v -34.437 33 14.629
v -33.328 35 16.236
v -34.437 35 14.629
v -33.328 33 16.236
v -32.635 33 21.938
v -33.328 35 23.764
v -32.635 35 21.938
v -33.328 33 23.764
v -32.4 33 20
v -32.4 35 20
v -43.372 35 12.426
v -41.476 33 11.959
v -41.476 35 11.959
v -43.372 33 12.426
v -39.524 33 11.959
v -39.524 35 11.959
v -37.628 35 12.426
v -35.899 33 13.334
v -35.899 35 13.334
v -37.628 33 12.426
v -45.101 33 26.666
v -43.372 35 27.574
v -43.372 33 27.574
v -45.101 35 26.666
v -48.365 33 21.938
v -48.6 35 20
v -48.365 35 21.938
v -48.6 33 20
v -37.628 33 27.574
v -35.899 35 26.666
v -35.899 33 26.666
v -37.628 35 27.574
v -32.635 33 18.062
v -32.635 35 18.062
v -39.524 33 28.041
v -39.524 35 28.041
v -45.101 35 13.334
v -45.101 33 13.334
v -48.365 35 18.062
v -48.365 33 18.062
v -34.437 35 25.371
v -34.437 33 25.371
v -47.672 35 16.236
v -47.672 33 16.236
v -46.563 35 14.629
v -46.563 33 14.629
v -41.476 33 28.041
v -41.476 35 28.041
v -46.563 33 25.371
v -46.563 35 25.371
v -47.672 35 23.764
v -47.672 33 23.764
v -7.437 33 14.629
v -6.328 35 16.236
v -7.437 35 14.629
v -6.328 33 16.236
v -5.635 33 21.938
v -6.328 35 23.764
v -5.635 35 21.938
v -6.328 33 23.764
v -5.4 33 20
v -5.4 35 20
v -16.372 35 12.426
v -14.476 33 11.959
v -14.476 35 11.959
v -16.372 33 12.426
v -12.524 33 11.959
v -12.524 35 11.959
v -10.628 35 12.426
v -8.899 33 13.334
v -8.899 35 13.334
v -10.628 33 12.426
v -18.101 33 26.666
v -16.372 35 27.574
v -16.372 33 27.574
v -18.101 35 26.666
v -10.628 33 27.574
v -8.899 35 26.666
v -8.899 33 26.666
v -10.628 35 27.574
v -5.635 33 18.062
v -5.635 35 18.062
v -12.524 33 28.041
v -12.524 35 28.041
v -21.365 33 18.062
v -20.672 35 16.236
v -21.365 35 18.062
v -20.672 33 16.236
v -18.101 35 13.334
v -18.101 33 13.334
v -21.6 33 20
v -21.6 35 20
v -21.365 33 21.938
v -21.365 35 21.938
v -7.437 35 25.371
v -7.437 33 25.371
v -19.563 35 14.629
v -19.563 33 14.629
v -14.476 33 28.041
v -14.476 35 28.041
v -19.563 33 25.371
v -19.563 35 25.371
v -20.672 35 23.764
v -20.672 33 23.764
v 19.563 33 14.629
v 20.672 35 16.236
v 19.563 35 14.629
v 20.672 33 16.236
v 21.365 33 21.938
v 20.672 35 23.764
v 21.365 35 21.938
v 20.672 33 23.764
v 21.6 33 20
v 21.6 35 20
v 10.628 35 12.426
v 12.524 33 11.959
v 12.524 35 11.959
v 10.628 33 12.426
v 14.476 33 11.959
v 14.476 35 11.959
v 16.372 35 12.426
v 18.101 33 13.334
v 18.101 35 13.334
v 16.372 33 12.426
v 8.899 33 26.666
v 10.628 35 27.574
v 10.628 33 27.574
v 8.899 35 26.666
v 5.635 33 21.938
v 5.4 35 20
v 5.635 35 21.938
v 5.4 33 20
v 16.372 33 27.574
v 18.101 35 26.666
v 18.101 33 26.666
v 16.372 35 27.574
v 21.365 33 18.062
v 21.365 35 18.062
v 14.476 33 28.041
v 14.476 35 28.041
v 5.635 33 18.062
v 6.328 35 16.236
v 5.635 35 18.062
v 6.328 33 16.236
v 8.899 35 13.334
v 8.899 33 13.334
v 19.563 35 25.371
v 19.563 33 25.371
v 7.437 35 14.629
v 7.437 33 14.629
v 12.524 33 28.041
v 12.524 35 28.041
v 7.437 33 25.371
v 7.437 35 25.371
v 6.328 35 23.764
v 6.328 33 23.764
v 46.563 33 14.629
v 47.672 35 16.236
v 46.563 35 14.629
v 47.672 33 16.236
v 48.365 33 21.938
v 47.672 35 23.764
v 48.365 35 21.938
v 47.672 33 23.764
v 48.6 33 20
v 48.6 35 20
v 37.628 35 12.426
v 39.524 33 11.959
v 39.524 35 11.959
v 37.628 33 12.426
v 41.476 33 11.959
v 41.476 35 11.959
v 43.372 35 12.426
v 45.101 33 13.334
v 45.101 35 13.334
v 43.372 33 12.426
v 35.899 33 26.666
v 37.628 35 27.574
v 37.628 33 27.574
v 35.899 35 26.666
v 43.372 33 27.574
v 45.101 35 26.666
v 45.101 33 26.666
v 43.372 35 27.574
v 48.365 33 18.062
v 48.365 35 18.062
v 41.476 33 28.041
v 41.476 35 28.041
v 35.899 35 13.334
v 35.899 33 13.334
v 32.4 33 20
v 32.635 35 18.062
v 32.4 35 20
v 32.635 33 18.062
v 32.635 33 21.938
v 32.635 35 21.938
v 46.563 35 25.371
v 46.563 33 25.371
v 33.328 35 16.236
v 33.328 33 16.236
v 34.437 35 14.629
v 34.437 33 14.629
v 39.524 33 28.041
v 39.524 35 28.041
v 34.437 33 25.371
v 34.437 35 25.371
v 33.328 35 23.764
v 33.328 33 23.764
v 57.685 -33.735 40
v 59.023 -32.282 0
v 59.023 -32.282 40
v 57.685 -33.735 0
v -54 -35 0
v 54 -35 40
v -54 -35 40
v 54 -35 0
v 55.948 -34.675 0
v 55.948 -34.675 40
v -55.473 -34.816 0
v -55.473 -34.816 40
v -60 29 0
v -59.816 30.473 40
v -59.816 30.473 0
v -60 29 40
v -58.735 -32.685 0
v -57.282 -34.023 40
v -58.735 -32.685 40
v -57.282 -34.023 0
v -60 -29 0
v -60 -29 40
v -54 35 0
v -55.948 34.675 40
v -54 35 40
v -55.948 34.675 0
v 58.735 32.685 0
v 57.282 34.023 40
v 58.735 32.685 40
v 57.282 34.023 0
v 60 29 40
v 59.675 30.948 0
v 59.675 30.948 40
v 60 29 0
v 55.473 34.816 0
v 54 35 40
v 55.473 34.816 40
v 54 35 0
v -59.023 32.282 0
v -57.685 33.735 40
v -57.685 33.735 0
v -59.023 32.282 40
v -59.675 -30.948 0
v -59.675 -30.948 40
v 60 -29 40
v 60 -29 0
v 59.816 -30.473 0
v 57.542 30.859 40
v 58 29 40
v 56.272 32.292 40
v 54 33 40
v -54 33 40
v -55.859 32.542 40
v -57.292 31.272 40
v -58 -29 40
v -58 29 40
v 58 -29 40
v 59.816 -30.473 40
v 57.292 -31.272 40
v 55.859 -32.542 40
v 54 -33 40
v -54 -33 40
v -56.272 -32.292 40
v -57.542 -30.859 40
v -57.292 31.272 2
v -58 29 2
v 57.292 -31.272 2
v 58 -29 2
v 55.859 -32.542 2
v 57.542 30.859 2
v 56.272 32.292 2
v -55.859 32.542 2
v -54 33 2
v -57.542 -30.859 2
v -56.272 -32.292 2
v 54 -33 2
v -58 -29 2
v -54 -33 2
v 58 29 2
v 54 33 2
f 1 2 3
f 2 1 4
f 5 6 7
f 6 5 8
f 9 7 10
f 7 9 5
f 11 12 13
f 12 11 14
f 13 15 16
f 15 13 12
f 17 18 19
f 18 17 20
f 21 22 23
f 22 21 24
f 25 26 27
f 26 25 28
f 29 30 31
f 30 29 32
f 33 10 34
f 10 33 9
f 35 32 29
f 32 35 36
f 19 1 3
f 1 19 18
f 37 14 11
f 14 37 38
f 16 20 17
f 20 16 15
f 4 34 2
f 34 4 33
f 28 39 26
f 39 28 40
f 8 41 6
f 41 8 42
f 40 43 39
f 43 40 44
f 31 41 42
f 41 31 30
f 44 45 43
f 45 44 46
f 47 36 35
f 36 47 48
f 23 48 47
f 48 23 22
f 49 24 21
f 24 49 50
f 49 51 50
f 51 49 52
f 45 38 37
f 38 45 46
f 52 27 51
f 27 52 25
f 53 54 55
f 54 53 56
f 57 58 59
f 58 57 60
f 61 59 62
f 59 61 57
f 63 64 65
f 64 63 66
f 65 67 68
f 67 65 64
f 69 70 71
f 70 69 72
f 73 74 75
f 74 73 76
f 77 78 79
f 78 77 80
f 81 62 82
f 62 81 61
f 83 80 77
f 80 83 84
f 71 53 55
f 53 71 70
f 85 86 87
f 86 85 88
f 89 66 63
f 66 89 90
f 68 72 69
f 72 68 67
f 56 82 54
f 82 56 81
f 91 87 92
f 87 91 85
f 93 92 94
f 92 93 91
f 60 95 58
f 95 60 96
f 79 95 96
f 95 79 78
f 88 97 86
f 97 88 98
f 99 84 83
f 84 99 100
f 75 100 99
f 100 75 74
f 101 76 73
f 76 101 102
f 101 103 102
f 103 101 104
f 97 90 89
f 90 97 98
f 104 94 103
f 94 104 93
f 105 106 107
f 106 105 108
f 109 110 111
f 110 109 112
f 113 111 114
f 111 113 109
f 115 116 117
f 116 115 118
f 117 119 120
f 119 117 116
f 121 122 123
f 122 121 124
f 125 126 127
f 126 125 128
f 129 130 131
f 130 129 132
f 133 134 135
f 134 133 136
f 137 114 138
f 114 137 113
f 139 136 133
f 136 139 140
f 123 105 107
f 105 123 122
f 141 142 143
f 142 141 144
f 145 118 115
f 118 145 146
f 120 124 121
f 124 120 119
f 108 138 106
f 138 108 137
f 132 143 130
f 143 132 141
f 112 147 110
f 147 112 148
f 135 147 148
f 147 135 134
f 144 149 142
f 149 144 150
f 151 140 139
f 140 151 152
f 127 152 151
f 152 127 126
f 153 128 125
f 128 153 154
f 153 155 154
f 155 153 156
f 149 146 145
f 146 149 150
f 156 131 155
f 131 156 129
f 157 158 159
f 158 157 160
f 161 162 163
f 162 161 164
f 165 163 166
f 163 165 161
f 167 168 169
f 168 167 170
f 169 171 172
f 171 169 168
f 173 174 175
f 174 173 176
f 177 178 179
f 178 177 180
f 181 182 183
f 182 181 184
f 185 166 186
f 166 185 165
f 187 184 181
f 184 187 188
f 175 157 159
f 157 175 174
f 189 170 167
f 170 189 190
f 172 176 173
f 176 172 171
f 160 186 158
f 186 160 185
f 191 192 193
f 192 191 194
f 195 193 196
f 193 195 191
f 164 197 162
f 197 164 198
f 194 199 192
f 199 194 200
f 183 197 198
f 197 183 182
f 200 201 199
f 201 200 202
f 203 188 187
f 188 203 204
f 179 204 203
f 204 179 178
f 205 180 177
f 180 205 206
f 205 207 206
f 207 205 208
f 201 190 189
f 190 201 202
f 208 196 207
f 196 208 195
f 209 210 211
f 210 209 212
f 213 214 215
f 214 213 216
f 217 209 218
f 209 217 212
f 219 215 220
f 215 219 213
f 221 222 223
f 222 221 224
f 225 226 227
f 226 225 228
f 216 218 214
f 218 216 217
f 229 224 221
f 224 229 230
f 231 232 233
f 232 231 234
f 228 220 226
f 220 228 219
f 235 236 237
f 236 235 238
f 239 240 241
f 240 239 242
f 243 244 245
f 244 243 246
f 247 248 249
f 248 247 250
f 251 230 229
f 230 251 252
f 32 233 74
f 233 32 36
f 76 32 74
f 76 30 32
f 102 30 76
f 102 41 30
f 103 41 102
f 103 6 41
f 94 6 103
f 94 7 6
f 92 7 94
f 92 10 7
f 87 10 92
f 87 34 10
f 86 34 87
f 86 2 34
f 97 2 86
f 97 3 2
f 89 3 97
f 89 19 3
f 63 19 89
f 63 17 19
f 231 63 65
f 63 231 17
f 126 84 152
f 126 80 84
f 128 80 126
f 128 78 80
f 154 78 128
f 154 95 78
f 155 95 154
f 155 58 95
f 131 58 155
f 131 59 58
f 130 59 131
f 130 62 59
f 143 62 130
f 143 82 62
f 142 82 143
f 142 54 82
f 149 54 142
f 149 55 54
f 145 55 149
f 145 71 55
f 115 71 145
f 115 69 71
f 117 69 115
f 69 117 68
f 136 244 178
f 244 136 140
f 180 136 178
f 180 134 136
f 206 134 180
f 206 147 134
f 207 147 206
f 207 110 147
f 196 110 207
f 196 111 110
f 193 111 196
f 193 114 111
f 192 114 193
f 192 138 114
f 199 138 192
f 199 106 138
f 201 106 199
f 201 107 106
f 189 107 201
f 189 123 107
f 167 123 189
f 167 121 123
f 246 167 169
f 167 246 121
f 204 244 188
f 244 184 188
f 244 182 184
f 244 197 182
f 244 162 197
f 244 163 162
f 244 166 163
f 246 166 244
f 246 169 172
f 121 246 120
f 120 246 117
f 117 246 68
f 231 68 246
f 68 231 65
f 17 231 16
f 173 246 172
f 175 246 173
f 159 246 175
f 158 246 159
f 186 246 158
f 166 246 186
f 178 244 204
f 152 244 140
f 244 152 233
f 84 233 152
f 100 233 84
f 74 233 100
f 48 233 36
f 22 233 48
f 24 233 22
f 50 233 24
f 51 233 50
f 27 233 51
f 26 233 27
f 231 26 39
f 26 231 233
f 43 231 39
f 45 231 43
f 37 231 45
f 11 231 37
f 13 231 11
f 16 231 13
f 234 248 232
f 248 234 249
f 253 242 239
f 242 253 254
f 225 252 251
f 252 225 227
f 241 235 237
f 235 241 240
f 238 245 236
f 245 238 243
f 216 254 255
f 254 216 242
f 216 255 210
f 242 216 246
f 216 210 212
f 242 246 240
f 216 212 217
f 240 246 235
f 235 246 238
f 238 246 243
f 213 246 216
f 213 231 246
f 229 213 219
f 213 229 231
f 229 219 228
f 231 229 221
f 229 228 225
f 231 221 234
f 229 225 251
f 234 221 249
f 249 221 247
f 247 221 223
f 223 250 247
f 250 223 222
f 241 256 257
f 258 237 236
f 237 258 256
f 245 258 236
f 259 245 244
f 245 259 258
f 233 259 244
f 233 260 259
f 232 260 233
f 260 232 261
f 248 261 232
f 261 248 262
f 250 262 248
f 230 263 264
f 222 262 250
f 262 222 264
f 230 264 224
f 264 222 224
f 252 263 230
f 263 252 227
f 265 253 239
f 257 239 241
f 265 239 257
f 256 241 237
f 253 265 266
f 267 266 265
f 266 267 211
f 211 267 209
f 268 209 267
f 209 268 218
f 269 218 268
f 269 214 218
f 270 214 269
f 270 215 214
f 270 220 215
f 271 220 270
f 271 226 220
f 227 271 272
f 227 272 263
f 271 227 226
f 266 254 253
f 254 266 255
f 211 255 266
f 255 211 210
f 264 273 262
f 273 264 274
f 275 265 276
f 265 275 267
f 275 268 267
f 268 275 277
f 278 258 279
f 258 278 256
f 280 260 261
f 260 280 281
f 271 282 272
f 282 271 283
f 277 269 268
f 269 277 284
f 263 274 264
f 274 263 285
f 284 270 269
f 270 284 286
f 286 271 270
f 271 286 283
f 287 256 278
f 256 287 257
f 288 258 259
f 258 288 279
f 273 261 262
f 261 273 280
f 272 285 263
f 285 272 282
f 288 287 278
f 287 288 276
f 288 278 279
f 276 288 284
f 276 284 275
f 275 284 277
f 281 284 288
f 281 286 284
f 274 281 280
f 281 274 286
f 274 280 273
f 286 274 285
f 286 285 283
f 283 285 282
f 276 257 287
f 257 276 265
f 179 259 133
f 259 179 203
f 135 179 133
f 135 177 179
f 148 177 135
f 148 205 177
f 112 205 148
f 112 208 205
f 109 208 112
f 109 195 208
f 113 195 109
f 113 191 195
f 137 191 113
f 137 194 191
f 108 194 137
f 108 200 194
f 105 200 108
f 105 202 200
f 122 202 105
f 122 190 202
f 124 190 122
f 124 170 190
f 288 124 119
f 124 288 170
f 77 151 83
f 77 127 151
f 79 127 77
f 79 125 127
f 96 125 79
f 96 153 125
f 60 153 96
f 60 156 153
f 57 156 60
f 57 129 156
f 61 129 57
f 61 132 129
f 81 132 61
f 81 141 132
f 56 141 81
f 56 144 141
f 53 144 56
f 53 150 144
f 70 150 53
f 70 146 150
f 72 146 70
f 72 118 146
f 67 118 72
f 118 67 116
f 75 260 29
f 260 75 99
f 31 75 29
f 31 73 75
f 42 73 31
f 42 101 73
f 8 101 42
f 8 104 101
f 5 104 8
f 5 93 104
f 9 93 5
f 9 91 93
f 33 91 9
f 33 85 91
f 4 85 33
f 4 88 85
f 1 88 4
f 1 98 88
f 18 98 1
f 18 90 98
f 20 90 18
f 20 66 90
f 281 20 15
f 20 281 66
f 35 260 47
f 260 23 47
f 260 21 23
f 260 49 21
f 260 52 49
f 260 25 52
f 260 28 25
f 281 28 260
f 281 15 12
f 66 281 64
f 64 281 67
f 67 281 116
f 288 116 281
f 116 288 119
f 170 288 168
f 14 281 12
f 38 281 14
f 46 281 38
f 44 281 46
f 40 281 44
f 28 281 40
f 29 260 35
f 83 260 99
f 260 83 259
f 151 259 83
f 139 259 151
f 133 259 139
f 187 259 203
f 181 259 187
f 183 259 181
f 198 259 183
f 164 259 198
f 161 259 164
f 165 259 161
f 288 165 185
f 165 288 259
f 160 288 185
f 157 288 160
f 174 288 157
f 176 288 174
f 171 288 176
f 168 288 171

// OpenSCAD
// file: params.scad
box_width=120;
box_height=70;
box_depth=40;
box_rounding=6;
thickness=2;
button_spacing=(box_width - 2*box_rounding) / 4;
button_coords=[ for (i=[0:3]) [(-1.5 + i)*button_spacing, box_height/2, box_depth/2] ];
// file: utils.scad
module rounded_square(size=1, center=false, r=1) {
  offset(r)
    offset(-r)
      square(size, center=center);
}
// main file
use <utils.scad>
include <params.scad>

module box() {
  color([40/255, 177/255, 214/255]) {
    // around
    difference() {
      linear_extrude(box_depth)
        rounded_square([box_width, box_height], r=box_rounding, center=true);

      // interior
      translate([0,0,thickness])
        linear_extrude(box_depth)
        rounded_square([box_width - 2*thickness, box_height - 2*thickness],
                       r=box_rounding - thickness,
                       center=true);

      // button holes
      for (coord=button_coords) {
        translate(coord)
          rotate([90, 0, 0])
          cylinder(d=16.2, h=3*thickness, center=true);
      }
    }
  }
}

box();
